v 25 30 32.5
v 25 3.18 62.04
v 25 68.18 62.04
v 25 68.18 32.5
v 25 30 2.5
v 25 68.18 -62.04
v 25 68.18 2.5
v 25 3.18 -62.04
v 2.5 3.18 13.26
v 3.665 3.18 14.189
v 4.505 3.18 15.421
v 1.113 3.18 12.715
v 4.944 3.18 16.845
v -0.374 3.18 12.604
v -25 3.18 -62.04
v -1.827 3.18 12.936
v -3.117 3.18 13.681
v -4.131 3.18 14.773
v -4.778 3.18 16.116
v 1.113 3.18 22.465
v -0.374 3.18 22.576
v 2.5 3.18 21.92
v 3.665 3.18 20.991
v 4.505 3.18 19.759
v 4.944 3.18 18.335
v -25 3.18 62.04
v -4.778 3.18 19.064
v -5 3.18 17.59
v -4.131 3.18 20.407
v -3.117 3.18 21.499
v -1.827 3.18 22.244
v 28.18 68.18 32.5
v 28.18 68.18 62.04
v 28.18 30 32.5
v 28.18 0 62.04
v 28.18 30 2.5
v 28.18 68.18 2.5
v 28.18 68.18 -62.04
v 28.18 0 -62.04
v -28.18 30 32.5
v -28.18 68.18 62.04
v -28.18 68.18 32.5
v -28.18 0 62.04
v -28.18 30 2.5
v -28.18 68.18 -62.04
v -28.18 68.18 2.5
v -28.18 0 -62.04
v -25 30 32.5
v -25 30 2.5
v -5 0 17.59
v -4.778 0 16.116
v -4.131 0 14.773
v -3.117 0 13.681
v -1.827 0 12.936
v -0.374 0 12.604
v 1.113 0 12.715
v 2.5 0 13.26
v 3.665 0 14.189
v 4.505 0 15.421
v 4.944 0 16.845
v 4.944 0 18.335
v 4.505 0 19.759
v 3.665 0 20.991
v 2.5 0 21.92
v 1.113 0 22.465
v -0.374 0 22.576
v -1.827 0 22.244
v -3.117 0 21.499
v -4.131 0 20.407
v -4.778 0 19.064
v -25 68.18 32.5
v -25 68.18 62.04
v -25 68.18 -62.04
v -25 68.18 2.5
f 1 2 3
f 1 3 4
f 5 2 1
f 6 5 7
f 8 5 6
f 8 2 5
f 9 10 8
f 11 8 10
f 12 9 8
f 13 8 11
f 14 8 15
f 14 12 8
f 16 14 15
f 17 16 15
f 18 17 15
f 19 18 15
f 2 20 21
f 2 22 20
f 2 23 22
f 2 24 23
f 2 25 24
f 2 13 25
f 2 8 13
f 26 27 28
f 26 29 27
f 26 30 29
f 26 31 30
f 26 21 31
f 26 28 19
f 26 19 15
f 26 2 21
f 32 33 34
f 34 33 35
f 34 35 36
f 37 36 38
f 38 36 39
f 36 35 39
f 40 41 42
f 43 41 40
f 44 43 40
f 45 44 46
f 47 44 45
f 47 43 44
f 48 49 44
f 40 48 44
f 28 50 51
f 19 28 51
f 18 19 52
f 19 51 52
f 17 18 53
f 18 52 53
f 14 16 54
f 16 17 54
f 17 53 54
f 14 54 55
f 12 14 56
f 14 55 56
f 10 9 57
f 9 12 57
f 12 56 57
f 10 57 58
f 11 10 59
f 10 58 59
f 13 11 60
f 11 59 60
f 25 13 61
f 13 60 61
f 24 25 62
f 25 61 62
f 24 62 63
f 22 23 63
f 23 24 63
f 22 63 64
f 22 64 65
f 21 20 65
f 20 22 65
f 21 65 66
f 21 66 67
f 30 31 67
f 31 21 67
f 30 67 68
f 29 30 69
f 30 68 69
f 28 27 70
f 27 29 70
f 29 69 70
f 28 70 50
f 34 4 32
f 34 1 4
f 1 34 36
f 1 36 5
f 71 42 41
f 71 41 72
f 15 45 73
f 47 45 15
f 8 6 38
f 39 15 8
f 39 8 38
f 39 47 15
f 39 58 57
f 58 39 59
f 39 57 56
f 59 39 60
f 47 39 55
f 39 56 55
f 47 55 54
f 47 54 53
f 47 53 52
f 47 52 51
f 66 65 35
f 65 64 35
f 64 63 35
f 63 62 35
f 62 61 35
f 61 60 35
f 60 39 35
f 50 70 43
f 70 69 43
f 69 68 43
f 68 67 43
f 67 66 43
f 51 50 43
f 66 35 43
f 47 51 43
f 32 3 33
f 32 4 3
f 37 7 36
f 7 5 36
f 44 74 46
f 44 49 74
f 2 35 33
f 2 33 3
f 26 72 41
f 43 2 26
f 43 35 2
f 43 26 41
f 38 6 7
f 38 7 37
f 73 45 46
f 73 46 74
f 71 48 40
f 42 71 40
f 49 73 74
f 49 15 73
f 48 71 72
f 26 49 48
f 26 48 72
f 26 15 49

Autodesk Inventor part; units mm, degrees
ref_plane "YZ Plane" through (0, 0, 0) normal (1, 0, 0) x (0, 1, 0)
ref_plane "XZ Plane" through (0, 0, 0) normal (0, 1, 0) x (-1, 0, 0)
ref_plane "XY Plane" through (0, 0, 0) normal (0, 0, 1) x (1, 0, 0)
sketch "Sketch1" plane through (0, 0, 0) normal (0, 1, 0) x (-1, 0, 0)
  line L0 (-25, 62.04) -> (25, 62.04)
  line L1 (25, 62.04) -> (25, -62.04)
  line L2 (25, -62.04) -> (-25, -62.04)
  line L3 (-25, -62.04) -> (-25, 62.04)
  line L4 (-25, 62.04) -> (25, -62.04) construction
  line L5 (25, 62.04) -> (-25, -62.04) construction
  circle A0 centre (0, 17.59) radius 5
  point P0 (0, 0)
  dimension "d0" = 50
  dimension "d1" = 124.08
  dimension "d2" = 10
  dimension "d3" = 44.45
  dimension "d4" = 25
extrude "Extrusion1" add sketch "Sketch1" along normal blind 3.18
sketch "Sketch4" plane through (0, 0, 0) normal (0, 1, 0) x (-1, 0, 0)
  circle A0 centre (0, 17.59) radius 5 projected
  line L0 (25, 62.04) -> (-25, 62.04) projected
  line L1 (-25, 62.04) -> (-25, -62.04) projected
  line L2 (-25, -62.04) -> (25, -62.04) projected
  line L3 (25, -62.04) -> (25, 62.04) projected
  line L4 (25, 62.04) -> (28.18, 62.04)
  line L5 (28.18, 62.04) -> (28.18, -62.04)
  line L6 (28.18, -62.04) -> (25, -62.04)
  line L7 (25, -62.04) -> (25, 62.04)
  line L8 (-25, 62.04) -> (-28.18, 62.04)
  line L9 (-28.18, 62.04) -> (-28.18, -62.04)
  line L10 (-28.18, -62.04) -> (-25, -62.04)
  line L11 (-25, -62.04) -> (-25, 62.04)
  point P0 (0, 0)
  dimension "d11" = 3.18
  dimension "d12" = 3.18
extrude "Extrusion3" add sketch "Sketch4" along normal blind 30 contours L4 L5 L6 L3 | L1 L10 L9 L8
sketch "Sketch5" plane through (0, 30, 0) normal (0, 1, 0) x (1, 0, 0)
  line L0 (-25, -62.04) -> (-25, 62.04) projected
  line L1 (-25, 62.04) -> (-28.18, 62.04) projected
  line L2 (-28.18, 62.04) -> (-28.18, -62.04) projected
  line L3 (-28.18, -62.04) -> (-25, -62.04) projected
  line L4 (25, -62.04) -> (28.18, -62.04) projected
  line L5 (28.18, -62.04) -> (28.18, 62.04) projected
  line L6 (28.18, 62.04) -> (25, 62.04) projected
  line L7 (25, 62.04) -> (25, -62.04) projected
  line L8 (-25, 62.04) -> (-25, -62.04) projected
  line L9 (-28.18, -62.04) -> (-25, -62.04)
  line L10 (-25, -62.04) -> (-25, -32.5)
  line L11 (-25, -32.5) -> (-28.18, -32.5)
  line L12 (-28.18, -32.5) -> (-28.18, -62.04)
  line L13 (-28.18, 62.04) -> (28.18, 62.04) projected
  line L14 (-28.18, 62.04) -> (-25, 62.04)
  line L15 (-25, 62.04) -> (-25, -2.5)
  line L16 (-25, -2.5) -> (-28.18, -2.5)
  line L17 (-28.18, -2.5) -> (-28.18, 62.04)
  line L18 (28.18, -62.04) -> (28.18, 62.04) projected
  line L19 (25, -62.04) -> (28.18, -62.04)
  line L20 (28.18, -62.04) -> (28.18, -32.5)
  line L21 (28.18, -32.5) -> (25, -32.5)
  line L22 (25, -32.5) -> (25, -62.04)
  line L23 (25, -62.04) -> (25, 62.04) projected
  line L24 (28.18, 62.04) -> (25, 62.04)
  line L25 (25, 62.04) -> (25, -2.5)
  line L26 (25, -2.5) -> (28.18, -2.5)
  line L27 (28.18, -2.5) -> (28.18, 62.04)
  point P0 (0, 0)
  dimension "d15" = 29.54
  dimension "d16" = 64.54
  dimension "d17" = 29.54
  dimension "d18" = 64.54
extrude "Extrusion4" add sketch "Sketch5" along normal blind 38.18 contours L3 L2 L11 L0 | L16 L2 L1 L0
sketch "Sketch6" plane through (0, 30, 0) normal (0, 1, 0) x (1, 0, 0)
  line L0 (25, -62.04) -> (28.18, -62.04) projected
  line L1 (28.18, -62.04) -> (28.18, 62.04) projected
  line L2 (28.18, 62.04) -> (25, 62.04) projected
  line L3 (25, 62.04) -> (25, -62.04) projected
  line L4 (28.18, -62.04) -> (28.18, 62.04) projected
  line L5 (25, -62.04) -> (25, 62.04) projected
  line L6 (28.18, -62.04) -> (25, -62.04)
  line L7 (25, -62.04) -> (25, -32.5)
  line L8 (25, -32.5) -> (28.18, -32.5)
  line L9 (28.18, -32.5) -> (28.18, -62.04)
  line L10 (28.18, 62.04) -> (25, 62.04)
  line L11 (25, 62.04) -> (25, -2.5)
  line L12 (25, -2.5) -> (28.18, -2.5)
  line L13 (28.18, -2.5) -> (28.18, 62.04)
  point P0 (0, 0)
  dimension "d21" = 29.54
  dimension "d22" = 64.54
extrude "Extrusion5" add sketch "Sketch6" along normal blind 38.18 contours L3 L8 L1 L0 | L3 L2 L1 L12
properties part number "Hombro_base"
